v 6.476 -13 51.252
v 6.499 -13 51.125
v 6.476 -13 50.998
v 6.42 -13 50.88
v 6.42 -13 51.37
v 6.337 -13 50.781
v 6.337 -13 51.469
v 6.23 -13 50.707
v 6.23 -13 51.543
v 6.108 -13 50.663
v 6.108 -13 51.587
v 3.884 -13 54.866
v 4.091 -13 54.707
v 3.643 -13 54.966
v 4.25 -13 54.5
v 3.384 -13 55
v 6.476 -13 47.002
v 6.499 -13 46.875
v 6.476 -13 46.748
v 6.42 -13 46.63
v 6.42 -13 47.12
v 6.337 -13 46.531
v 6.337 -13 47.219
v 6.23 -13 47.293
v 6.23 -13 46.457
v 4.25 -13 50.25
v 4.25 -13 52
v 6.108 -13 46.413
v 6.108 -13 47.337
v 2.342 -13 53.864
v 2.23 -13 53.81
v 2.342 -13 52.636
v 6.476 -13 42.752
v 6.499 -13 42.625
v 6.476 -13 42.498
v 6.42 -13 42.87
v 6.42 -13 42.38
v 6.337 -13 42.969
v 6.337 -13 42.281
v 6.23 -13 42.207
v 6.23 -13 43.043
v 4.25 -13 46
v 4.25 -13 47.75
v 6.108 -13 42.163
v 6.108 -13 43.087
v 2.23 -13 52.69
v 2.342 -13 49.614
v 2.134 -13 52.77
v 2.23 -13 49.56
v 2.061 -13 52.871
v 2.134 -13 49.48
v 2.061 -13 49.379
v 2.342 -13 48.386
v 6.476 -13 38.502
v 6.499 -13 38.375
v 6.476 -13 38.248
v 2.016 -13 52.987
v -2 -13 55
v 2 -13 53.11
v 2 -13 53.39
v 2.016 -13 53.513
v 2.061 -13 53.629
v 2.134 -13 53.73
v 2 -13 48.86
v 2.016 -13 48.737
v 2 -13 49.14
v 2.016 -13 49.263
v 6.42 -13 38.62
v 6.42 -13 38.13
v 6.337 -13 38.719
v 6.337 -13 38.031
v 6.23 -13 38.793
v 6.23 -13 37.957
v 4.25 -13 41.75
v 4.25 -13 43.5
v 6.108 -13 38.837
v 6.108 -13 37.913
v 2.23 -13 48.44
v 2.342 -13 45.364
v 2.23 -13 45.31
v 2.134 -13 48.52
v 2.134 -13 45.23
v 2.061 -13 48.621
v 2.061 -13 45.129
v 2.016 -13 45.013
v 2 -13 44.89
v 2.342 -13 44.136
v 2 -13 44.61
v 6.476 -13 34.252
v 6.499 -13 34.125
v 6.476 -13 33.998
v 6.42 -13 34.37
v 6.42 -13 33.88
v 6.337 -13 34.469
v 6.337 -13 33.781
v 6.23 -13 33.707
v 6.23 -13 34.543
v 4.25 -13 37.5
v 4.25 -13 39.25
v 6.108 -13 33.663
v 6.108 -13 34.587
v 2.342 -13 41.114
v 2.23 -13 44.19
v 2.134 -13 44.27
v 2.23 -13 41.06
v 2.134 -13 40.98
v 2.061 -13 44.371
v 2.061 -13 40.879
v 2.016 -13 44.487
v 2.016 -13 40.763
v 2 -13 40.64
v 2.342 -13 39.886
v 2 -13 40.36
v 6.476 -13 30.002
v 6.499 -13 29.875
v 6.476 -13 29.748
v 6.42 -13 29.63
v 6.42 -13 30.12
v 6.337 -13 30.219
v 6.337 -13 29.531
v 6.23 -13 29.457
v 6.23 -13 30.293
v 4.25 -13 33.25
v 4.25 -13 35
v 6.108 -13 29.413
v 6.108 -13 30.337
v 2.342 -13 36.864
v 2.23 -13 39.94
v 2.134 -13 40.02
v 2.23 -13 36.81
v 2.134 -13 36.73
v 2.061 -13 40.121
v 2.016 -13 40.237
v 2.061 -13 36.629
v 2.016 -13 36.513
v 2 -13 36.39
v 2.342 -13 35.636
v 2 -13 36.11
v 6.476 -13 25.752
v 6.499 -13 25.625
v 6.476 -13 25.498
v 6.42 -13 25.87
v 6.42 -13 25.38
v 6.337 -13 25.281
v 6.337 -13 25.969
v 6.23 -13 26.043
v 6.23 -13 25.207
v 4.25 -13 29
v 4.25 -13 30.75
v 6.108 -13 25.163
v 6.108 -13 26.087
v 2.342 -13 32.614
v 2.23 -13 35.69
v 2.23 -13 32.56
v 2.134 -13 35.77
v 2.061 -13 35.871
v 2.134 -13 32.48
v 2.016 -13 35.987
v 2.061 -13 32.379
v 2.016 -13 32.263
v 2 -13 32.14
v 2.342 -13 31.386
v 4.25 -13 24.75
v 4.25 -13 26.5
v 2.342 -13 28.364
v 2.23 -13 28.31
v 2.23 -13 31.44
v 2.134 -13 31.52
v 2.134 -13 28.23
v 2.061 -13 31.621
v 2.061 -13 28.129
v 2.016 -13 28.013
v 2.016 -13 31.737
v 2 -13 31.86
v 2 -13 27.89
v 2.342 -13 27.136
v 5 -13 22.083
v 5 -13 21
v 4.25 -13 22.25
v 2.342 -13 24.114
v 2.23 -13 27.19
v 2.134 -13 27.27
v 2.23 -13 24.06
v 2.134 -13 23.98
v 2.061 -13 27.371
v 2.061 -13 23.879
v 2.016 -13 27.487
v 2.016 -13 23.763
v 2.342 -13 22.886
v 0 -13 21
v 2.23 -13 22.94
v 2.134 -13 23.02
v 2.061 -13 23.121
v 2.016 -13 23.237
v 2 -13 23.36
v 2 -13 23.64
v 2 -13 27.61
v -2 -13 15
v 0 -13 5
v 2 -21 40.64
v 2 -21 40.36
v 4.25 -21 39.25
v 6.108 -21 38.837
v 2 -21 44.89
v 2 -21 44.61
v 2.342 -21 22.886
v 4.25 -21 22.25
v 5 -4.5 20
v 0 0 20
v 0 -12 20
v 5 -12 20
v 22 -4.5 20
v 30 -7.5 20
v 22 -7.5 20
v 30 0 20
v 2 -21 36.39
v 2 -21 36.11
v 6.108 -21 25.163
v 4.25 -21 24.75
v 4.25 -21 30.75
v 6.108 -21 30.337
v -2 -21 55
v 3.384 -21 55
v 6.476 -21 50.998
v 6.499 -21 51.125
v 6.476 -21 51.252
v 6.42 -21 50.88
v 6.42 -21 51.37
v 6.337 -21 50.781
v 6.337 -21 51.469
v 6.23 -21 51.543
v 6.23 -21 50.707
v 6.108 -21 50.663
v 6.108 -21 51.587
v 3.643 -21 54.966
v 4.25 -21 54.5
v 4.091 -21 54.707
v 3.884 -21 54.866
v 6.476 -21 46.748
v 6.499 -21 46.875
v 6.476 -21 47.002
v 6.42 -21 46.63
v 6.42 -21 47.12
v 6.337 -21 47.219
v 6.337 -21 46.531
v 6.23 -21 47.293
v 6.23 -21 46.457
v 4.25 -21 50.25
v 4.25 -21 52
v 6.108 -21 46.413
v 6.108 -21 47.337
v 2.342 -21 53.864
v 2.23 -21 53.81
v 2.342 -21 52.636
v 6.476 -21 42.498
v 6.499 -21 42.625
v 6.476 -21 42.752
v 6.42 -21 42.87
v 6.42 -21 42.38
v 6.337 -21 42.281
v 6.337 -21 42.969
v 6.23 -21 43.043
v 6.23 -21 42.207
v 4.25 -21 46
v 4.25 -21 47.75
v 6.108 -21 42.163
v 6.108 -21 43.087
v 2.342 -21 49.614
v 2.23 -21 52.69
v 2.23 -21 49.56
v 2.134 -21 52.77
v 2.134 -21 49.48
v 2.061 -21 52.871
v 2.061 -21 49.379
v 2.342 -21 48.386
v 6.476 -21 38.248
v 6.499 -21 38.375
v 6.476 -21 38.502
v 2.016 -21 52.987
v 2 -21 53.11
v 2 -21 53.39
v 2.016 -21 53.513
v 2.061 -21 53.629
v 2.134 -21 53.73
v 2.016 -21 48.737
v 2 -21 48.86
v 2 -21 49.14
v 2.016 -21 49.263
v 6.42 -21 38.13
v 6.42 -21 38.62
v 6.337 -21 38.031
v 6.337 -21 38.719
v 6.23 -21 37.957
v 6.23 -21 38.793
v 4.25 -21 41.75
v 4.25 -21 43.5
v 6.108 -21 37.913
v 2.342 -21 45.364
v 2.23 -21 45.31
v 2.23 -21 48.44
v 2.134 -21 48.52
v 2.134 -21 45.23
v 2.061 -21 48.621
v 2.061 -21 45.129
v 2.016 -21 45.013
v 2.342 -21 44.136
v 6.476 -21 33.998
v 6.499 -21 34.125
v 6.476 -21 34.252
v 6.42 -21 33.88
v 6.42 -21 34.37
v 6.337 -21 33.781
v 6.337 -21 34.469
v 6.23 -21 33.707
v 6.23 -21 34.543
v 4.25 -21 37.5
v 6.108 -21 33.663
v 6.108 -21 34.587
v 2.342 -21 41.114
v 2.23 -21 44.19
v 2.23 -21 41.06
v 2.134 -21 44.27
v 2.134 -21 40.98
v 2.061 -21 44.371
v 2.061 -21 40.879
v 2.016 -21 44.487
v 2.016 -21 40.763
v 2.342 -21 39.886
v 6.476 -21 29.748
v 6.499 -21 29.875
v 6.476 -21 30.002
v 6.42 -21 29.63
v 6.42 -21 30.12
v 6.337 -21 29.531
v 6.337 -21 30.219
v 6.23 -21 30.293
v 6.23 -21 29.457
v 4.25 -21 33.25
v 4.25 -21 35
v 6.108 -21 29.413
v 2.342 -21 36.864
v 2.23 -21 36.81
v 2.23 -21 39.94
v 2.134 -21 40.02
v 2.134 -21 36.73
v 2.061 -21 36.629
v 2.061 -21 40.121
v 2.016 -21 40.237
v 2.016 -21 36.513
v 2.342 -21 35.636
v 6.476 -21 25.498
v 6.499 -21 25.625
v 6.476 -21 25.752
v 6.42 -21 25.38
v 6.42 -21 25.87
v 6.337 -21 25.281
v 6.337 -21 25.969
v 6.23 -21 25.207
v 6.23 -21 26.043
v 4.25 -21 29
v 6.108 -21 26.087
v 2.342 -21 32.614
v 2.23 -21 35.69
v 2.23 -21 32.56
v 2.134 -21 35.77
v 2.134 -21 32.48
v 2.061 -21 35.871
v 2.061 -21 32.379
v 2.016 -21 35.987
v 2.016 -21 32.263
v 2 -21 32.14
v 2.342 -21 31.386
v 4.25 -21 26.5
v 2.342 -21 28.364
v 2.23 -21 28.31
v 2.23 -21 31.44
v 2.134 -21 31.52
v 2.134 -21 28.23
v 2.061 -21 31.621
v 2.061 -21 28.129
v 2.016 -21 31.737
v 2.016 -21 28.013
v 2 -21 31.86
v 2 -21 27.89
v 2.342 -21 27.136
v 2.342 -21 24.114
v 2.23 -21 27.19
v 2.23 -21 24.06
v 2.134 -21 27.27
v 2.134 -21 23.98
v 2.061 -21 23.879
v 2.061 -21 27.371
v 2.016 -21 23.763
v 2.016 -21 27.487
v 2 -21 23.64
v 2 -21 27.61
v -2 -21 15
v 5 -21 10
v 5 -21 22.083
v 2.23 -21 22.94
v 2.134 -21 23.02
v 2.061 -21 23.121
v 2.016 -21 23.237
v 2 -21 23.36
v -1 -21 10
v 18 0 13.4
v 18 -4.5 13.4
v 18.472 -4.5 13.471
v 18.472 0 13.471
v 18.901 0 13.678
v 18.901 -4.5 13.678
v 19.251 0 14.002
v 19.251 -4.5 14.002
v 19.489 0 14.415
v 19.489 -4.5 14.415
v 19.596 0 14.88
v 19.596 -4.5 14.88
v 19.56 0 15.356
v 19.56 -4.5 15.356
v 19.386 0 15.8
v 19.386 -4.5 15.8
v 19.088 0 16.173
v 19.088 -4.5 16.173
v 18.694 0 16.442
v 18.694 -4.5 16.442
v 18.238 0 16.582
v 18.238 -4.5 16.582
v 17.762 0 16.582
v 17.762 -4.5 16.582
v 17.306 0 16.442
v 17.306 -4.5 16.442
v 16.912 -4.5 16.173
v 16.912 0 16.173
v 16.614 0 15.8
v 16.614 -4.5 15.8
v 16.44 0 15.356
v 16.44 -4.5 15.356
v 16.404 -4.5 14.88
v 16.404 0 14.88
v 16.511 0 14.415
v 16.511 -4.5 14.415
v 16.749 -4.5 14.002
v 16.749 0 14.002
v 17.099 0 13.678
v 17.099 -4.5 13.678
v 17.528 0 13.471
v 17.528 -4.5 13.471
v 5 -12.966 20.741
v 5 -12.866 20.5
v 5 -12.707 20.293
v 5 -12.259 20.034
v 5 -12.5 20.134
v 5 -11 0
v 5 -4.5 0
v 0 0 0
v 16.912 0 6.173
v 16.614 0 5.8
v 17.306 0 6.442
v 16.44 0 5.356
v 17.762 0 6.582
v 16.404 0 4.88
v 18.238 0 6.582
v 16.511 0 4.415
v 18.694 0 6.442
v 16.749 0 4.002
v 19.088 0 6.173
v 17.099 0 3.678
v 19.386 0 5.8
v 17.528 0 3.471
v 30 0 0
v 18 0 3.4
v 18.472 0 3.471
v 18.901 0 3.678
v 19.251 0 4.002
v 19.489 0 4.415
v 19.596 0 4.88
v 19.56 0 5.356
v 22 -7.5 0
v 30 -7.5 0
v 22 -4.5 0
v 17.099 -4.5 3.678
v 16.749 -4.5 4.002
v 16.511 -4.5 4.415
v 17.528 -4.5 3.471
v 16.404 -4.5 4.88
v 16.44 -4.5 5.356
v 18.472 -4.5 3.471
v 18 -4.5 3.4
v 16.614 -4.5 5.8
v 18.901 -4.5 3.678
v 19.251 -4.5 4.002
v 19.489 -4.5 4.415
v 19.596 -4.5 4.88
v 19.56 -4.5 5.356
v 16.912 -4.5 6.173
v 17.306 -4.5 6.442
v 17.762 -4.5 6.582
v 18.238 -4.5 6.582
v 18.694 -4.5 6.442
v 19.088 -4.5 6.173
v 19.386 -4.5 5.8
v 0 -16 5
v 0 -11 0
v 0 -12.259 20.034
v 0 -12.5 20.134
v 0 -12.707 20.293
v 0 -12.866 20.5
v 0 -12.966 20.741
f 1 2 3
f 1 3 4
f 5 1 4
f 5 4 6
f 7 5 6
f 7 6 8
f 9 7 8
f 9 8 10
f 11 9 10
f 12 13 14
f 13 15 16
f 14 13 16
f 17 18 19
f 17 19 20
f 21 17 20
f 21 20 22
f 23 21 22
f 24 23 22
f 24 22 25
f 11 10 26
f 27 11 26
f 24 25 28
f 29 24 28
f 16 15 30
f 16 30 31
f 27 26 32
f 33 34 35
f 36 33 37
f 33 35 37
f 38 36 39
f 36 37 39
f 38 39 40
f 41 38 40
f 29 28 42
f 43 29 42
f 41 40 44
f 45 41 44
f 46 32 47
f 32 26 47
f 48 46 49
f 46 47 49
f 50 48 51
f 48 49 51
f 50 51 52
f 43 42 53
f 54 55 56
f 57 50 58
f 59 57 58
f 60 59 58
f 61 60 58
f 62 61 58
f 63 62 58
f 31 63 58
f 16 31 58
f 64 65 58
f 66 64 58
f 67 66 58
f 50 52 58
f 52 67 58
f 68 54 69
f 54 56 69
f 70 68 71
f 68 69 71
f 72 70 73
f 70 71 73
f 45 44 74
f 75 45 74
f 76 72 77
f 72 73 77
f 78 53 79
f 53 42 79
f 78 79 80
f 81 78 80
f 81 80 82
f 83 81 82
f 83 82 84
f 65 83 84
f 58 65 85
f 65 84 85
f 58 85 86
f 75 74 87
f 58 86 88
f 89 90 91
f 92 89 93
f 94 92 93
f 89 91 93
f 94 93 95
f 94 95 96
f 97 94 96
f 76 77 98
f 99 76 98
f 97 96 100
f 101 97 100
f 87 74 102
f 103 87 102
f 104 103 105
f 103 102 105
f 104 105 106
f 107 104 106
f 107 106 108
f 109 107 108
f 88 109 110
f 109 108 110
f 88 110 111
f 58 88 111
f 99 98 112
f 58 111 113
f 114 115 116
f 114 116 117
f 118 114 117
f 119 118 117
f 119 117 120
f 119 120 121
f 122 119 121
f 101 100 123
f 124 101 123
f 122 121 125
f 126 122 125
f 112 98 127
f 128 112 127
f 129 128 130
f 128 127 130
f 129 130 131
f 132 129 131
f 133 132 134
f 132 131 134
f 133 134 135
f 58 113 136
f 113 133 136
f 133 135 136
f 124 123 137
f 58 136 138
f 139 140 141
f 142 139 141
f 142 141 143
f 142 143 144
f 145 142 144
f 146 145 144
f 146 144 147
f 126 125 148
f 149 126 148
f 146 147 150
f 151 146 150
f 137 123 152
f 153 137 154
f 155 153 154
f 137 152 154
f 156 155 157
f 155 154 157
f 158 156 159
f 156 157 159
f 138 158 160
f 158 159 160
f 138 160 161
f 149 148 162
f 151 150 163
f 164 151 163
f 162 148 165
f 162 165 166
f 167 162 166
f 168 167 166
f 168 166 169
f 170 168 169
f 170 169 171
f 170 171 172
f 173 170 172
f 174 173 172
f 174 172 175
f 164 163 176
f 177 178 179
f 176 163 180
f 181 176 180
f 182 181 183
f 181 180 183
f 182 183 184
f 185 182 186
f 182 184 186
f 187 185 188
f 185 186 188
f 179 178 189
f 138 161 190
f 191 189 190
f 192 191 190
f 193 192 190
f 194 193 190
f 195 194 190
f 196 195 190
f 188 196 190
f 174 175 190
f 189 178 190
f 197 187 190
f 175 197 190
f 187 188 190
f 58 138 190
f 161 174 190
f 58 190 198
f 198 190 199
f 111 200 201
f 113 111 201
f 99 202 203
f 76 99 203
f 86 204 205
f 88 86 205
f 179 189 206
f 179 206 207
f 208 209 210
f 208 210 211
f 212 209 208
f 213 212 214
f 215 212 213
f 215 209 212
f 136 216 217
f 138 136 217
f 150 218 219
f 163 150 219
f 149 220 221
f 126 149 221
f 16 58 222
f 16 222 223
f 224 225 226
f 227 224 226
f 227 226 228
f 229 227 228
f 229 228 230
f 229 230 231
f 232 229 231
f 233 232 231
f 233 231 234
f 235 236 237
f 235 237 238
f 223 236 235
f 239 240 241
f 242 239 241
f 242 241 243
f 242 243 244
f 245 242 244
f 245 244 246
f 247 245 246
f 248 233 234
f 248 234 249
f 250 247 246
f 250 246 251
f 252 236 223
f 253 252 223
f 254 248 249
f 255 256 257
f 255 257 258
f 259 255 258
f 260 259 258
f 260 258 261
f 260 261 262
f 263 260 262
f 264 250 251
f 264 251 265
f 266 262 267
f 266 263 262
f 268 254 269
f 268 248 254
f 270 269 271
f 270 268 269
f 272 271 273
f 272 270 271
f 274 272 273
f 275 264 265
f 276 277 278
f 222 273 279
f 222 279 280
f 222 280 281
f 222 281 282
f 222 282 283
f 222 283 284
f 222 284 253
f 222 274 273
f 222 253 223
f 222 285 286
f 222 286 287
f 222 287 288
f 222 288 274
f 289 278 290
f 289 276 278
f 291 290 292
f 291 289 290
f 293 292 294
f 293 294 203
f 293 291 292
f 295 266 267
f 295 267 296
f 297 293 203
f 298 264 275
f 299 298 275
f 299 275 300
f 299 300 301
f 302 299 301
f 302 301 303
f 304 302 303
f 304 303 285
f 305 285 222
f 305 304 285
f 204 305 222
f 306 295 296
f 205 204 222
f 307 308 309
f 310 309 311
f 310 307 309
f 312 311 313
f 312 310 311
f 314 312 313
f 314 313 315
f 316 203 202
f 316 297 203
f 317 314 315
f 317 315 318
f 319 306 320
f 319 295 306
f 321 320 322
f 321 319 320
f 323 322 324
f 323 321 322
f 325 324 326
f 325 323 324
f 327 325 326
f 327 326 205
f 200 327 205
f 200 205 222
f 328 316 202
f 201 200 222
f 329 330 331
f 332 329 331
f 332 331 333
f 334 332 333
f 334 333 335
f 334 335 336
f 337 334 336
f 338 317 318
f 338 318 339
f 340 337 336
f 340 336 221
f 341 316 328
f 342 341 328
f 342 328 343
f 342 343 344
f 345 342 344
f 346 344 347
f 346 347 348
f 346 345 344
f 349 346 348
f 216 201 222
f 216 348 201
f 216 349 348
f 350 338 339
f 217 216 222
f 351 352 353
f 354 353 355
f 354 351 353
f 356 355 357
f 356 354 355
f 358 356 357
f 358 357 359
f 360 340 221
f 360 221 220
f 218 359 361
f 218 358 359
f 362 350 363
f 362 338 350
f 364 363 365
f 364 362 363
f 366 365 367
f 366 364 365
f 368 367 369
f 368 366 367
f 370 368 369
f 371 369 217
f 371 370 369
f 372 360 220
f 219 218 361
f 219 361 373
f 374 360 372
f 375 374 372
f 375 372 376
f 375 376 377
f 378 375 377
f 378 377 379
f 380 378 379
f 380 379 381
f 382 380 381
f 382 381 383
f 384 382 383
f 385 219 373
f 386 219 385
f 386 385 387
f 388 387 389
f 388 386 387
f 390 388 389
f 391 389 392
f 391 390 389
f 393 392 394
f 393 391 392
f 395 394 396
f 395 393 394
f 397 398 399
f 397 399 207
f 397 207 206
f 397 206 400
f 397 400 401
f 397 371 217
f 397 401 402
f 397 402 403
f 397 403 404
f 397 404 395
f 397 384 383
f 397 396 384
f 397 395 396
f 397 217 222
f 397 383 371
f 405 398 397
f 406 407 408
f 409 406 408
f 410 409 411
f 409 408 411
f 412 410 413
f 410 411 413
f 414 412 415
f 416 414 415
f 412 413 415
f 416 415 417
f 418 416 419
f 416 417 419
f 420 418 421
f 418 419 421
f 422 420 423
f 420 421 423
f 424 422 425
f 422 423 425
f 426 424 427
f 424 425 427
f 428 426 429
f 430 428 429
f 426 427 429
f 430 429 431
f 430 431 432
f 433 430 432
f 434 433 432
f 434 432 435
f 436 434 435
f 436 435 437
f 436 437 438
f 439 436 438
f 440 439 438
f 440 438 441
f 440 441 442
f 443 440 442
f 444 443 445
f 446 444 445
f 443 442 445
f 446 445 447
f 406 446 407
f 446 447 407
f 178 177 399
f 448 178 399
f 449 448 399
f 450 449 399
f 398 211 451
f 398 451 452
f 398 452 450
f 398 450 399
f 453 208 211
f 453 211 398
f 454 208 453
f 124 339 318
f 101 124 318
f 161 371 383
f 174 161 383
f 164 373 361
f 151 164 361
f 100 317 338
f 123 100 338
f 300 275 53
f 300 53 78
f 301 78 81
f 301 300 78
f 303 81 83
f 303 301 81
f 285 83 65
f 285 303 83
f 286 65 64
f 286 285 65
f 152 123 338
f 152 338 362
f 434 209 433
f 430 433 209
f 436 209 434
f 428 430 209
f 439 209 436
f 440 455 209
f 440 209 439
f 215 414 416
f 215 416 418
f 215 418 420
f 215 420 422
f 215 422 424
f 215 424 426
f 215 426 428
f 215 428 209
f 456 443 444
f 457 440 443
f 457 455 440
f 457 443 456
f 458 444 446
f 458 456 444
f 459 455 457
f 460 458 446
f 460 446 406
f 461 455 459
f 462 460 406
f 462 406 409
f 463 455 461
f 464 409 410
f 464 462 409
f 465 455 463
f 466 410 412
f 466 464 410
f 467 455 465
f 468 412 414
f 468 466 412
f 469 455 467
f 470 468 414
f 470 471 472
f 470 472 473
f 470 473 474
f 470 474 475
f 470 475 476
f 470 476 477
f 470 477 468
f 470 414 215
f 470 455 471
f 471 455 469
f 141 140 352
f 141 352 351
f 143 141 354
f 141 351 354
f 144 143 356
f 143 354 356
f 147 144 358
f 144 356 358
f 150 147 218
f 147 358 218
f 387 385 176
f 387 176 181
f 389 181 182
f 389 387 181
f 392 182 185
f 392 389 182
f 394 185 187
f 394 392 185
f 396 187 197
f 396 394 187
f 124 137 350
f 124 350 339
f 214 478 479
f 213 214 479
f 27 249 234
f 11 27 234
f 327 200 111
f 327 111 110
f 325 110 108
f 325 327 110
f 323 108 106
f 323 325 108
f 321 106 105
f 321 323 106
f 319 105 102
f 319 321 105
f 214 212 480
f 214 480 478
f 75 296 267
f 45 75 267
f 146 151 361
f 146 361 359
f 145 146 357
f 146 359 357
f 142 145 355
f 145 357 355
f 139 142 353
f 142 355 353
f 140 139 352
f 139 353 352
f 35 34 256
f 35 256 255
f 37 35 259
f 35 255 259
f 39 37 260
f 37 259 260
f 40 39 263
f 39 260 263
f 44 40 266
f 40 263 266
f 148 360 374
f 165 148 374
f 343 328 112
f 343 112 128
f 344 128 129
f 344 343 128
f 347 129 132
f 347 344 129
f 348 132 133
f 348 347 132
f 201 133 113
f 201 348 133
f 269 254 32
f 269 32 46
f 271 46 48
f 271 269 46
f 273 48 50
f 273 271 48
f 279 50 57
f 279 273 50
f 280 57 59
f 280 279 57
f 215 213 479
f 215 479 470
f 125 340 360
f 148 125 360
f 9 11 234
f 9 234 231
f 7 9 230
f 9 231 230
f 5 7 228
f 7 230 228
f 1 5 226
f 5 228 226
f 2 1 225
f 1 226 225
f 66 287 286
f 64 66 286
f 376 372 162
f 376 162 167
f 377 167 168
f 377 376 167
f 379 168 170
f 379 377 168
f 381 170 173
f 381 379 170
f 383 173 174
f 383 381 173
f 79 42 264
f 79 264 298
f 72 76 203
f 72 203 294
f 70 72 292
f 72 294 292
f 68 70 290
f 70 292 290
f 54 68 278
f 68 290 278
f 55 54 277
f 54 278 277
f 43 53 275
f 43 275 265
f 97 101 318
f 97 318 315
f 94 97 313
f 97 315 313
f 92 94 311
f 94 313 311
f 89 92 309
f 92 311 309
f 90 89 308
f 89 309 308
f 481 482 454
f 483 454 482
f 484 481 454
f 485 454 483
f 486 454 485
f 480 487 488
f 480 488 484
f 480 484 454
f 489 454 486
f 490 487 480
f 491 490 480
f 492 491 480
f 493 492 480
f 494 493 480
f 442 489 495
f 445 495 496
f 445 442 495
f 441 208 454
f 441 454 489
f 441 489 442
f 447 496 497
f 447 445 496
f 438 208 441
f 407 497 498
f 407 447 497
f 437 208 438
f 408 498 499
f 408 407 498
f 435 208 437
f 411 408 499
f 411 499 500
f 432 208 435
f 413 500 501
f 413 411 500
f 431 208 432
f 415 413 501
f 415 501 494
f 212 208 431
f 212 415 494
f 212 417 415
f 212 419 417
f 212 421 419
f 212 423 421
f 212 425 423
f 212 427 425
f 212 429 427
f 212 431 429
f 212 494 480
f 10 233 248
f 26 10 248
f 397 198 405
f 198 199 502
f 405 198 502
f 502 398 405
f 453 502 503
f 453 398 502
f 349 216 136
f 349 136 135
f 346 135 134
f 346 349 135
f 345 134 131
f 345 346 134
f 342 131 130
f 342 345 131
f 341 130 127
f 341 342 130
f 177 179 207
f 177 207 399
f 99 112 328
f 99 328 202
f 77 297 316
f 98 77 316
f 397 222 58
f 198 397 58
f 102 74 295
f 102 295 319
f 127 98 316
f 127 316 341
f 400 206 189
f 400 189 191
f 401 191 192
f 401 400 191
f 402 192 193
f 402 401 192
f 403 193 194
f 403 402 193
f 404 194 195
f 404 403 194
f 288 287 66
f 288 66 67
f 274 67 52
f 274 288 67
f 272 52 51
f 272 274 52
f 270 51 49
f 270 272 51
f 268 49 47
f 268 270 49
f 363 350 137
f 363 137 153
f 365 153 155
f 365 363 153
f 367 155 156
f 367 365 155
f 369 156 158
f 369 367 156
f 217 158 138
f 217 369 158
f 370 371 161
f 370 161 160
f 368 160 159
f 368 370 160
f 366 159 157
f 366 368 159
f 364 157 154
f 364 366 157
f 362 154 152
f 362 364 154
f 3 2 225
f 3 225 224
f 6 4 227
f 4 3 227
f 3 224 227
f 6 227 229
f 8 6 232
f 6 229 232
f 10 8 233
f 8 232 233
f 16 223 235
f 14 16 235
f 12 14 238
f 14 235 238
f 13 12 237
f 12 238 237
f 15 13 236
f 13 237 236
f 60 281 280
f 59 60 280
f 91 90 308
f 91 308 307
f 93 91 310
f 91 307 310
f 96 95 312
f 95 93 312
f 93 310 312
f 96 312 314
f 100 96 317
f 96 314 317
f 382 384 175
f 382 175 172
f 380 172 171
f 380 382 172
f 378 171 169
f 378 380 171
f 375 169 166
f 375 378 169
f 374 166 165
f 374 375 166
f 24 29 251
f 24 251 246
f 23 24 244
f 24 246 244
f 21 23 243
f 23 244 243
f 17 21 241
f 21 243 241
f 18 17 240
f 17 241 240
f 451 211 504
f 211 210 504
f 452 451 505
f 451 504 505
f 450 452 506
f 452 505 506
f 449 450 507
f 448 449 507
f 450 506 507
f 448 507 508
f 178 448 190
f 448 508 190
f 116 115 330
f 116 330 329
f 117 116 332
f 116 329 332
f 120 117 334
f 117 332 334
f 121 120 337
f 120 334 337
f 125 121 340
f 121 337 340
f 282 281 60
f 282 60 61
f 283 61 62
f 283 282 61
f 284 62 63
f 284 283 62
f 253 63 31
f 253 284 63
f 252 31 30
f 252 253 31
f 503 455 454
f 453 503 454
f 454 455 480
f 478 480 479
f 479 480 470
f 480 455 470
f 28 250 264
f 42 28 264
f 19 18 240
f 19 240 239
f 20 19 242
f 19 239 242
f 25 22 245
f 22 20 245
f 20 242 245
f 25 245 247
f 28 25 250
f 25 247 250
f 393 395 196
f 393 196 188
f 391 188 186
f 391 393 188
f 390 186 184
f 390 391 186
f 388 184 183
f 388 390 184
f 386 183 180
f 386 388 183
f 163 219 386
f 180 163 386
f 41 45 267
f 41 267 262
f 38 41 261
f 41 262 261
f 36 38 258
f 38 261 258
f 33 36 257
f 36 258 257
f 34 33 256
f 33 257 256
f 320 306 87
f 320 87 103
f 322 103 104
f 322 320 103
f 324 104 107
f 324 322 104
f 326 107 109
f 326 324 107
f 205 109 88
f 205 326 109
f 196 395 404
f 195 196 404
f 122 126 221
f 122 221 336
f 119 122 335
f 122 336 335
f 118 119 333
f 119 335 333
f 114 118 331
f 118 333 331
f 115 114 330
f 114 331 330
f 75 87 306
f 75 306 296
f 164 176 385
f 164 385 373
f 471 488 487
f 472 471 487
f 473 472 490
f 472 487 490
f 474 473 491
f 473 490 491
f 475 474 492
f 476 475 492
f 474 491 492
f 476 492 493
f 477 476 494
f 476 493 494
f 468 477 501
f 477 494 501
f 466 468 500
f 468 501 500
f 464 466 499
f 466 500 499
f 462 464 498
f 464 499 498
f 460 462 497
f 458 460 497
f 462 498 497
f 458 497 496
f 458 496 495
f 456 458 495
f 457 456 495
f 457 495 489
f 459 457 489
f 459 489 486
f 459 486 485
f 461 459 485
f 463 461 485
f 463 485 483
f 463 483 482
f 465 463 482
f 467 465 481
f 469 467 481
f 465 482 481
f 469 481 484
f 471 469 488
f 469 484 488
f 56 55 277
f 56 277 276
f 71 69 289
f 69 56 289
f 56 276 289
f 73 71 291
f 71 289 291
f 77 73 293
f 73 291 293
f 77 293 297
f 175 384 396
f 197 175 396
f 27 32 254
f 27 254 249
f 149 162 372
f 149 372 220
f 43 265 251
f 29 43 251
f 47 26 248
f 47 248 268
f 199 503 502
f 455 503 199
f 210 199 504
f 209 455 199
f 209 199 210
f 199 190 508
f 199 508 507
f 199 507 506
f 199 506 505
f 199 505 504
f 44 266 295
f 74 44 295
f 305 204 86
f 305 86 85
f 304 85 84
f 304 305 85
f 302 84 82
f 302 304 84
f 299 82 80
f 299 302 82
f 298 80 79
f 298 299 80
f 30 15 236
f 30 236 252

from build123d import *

# Parameters (mm, degrees)
SKETCH1_W           = 30
SKETCH1_H           = 16
BOSS_EXTRUDE1_DEPTH = 20
CUT_EXTRUDE1_DEPTH  = 20
SKETCH3_W           = 6
SKETCH3_H           = 10
BOSS_EXTRUDE2_DEPTH = 5
SKETCH9_R           = 1.6
CUT_EXTRUDE3_DEPTH  = 4.5
SKETCH11_W          = 10
SKETCH11_H          = 8
BOSS_EXTRUDE4_DEPTH = 40
CHAMFER2_SIZE2      = 10
CHAMFER2_SIZE       = 2
FILLET1_R           = 1
CUT_EXTRUDE4_DEPTH  = 8
SKETCH13_W          = 2
SKETCH13_H          = 8
BOSS_EXTRUDE5_DEPTH = 10
LPATTERN1_COUNT     = 8
LPATTERN1_PITCH     = 4.25
FILLET2_R           = 0.5
FILLET3_R           = 1
SKETCH14_W          = 2
SKETCH14_H          = 8
CUT_EXTRUDE5_DEPTH  = 17
CHAMFER9_SIZE       = 5
SKETCH15_W          = 19.120114905
SKETCH15_H          = 8.62957368
CUT_EXTRUDE6_DEPTH  = 1


# Some blends are built 0.0001 mm under size
with BuildPart() as part:
    # Sketch1 → Boss-Extrude1 (new body)
    with BuildSketch(Plane.XY):
        with Locations((15, -8)):
            Rectangle(SKETCH1_W, SKETCH1_H)
    extrude(amount=BOSS_EXTRUDE1_DEPTH)

    # Sketch2 → Cut-Extrude1 (cut)
    with BuildSketch(Plane.XY.offset(20)):
        Polygon((22, -4.5), (22, -7.5), (30, -7.5), (30, -16), (5, -16), (5, -4.5), align=None)
    extrude(amount=-CUT_EXTRUDE1_DEPTH, mode=Mode.SUBTRACT)

    # Sketch3 → Boss-Extrude2 (add)
    with BuildSketch(Plane.XZ.offset(16)):
        with Locations((3, 10)):
            Rectangle(SKETCH3_W, SKETCH3_H)
    extrude(amount=BOSS_EXTRUDE2_DEPTH)

    # Sketch9 → Cut-Extrude3 (cut)
    with BuildSketch(Plane.XZ.offset(4.5)):
        with Locations(Location((18, 15, 0), (0, 0, 270))):
            Circle(SKETCH9_R)
        with Locations(Location((18, 5, 0), (0, 0, 270))):
            Circle(SKETCH9_R)
    extrude(amount=-CUT_EXTRUDE3_DEPTH, mode=Mode.SUBTRACT)

    # Sketch11 → Boss-Extrude4 (add)
    with BuildSketch(Plane.XY.offset(15)):
        with Locations((3, -17)):
            Rectangle(SKETCH11_W, SKETCH11_H)
    extrude(amount=BOSS_EXTRUDE4_DEPTH)

    # Chamfer2
    chamfer2_edges = [part.edges().sort_by_distance(p)[0] for p in [
        (0, -17, 15),
    ]]
    chamfer2_side = [part.faces().sort_by_distance(p)[0] for p in [
        (-0.04, -17, 15),
    ]]
    chamfer(chamfer2_edges, length=CHAMFER2_SIZE - 0.0001, length2=CHAMFER2_SIZE2 - 0.0001, reference=chamfer2_side[0])  # a hair under: the kernel refuses the full size

    # Fillet1
    fillet1_edges = [part.edges().sort_by_distance(p)[0] for p in [
        (2.5, -13, 20),
    ]]
    fillet(fillet1_edges, radius=FILLET1_R)

    # Sketch12 → Cut-Extrude4 (cut)
    with BuildSketch(Plane.XZ.offset(21)):
        Polygon((6.5, 55), (4.25, 54.5), (2, 53.75), (2, 52.75), (4.25, 52), (6.5, 51.5), (6.5, 50.75), (8, 50.75), (8, 55), align=None)
    cut_extrude4 = extrude(amount=-CUT_EXTRUDE4_DEPTH, mode=Mode.SUBTRACT)

    # Sketch13 → Boss-Extrude5 (add)
    with BuildSketch(Plane(origin=(0, 0, 15), x_dir=(-1, 0, 0), z_dir=(0, 0, -1))):
        with Locations((-7, -17)):
            Rectangle(SKETCH13_W, SKETCH13_H)
    extrude(amount=BOSS_EXTRUDE5_DEPTH)

    # LPattern1: Cut-Extrude4 ×8
    with Locations(*[(0, 0, -i * LPATTERN1_PITCH) for i in range(1, LPATTERN1_COUNT)]):
        add(cut_extrude4, mode=Mode.SUBTRACT)

    # Fillet2
    # the kernel refuses this fillet: 0.5 mm, written as the material it adds along each edge
    with BuildSketch(Plane(origin=(2, -21, 52.75), x_dir=(0.9486832980505142, 0, -0.31622776601683683), z_dir=(0, 1, 0)), Plane(origin=(2, -21, 53.75), x_dir=(0, 0, -1), z_dir=(0, 1, 0)), Plane(origin=(2, -21, 48.5), x_dir=(0.9486832980505137, 0, -0.31622776601683833), z_dir=(0, 1, 0)), Plane(origin=(2, -21, 49.5), x_dir=(0, 0, -1), z_dir=(0, 1, 0)), Plane(origin=(2, -21, 44.25), x_dir=(0.9486832980505137, 0, -0.31622776601683833), z_dir=(0, 1, 0)), Plane(origin=(2, -21, 45.25), x_dir=(0, 0, -1), z_dir=(0, 1, 0)), Plane(origin=(2, -21, 35.75), x_dir=(0.9486832980505137, 0, -0.31622776601683833), z_dir=(0, 1, 0)), Plane(origin=(2, -21, 36.75), x_dir=(0, 0, -1), z_dir=(0, 1, 0)), Plane(origin=(2, -21, 40), x_dir=(0.9486832980505137, 0, -0.31622776601683833), z_dir=(0, 1, 0)), Plane(origin=(2, -21, 41), x_dir=(0, 0, -1), z_dir=(0, 1, 0)), Plane(origin=(2, -21, 23), x_dir=(0.9486832980505137, 0, -0.31622776601683833), z_dir=(0, 1, 0)), Plane(origin=(2, -21, 24), x_dir=(0, 0, -1), z_dir=(0, 1, 0)), Plane(origin=(2, -21, 27.25), x_dir=(0.9486832980505137, 0, -0.31622776601683833), z_dir=(0, 1, 0)), Plane(origin=(2, -21, 28.25), x_dir=(0, 0, -1), z_dir=(0, 1, 0)), Plane(origin=(2, -21, 32.5), x_dir=(0, 0, -1), z_dir=(0, 1, 0)), Plane(origin=(2, -21, 31.5), x_dir=(0.9486832980505137, 0, -0.31622776601683833), z_dir=(0, 1, 0))) as fillet2_piece_1:
        with BuildLine():
            CenterArc((FILLET2_R * 0.720759220056, -FILLET2_R), FILLET2_R, 90, 71.565051177)
            Line((-FILLET2_R * 0.227924077994, -FILLET2_R * 0.683772233983), (0, 0))
            Line((0, 0), (FILLET2_R * 0.720759220056, 0))
        make_face()
    extrude(amount=8)
    # the kernel refuses this fillet: 0.5 mm, written as the material it takes off along each edge
    with BuildSketch(Plane(origin=(6.5, -22.002714508, 33.75), x_dir=(-0.9761870601839537, 0, -0.21693045781865147), z_dir=(0, 1, 0)), Plane(origin=(6.5, -22.002714508, 34.5), x_dir=(0, 0, -1), z_dir=(0, 1, 0)), Plane(origin=(6.5, -22.002714508, 38), x_dir=(-0.9761870601839536, 0, -0.21693045781865192), z_dir=(0, 1, 0)), Plane(origin=(6.5, -22.002714508, 38.75), x_dir=(0, 0, -1), z_dir=(0, 1, 0)), Plane(origin=(6.5, -22.002714508, 42.25), x_dir=(-0.9761870601839541, 0, -0.21693045781865056), z_dir=(0, 1, 0)), Plane(origin=(6.5, -22.002714508, 43), x_dir=(0, 0, -1), z_dir=(0, 1, 0)), Plane(origin=(6.5, -22.002714508, 46.5), x_dir=(-0.9761870601839537, 0, -0.21693045781865147), z_dir=(0, 1, 0)), Plane(origin=(6.5, -22.002714508, 47.25), x_dir=(0, 0, -1), z_dir=(0, 1, 0)), Plane(origin=(6.5, -22.002714508, 50.75), x_dir=(-0.9761870601839541, 0, -0.21693045781865006), z_dir=(0, 1, 0)), Plane(origin=(6.5, -22.002714508, 51.5), x_dir=(0, 0, -1), z_dir=(0, 1, 0)), Plane(origin=(6.5, -22.002714508, 25.25), x_dir=(-0.9761870601839524, 0, -0.21693045781865805), z_dir=(0, 1, 0)), Plane(origin=(6.5, -22.002714508, 26), x_dir=(0, 0, -1), z_dir=(0, 1, 0)), Plane(origin=(6.5, -22.002714508, 29.5), x_dir=(-0.9761870601839522, 0, -0.216930457818659), z_dir=(0, 1, 0)), Plane(origin=(6.5, -22.002714508, 30.25), x_dir=(0, 0, -1), z_dir=(0, 1, 0))) as fillet2_2_piece_1:
        with BuildLine():
            CenterArc((FILLET2_R * 0.802171606366, FILLET2_R), FILLET2_R, 192.528807709, 77.471192291)
            Line((-FILLET2_R * 0.174015453818, FILLET2_R * 0.783069542181), (0, 0))
            Line((0, 0), (FILLET2_R * 0.802171606366, 0))
        make_face()
    extrude(amount=10.005429016, mode=Mode.SUBTRACT)

    # Fillet3
    # the kernel refuses this fillet: 1 mm, written as the material it takes off along each edge
    with BuildSketch(Plane(origin=(6.5, -28.790063509, 55), x_dir=(-1, 0, 0), z_dir=(0, 1, 0))) as fillet3_piece_1:
        with BuildLine():
            CenterArc((3.116025404, -1), FILLET3_R, 90, 60)
            Line((2.25, -0.5), (0, 0))
            Line((0, 0), (3.116025404, 0))
        make_face()
    extrude(amount=23.580127019, mode=Mode.SUBTRACT)

    # Sketch14 → Cut-Extrude5 (cut)
    with BuildSketch(Plane(origin=(0, 0, 5), x_dir=(-1, 0, 0), z_dir=(0, 0, -1))):
        with Locations((-7, -17)):
            Rectangle(SKETCH14_W, SKETCH14_H)
    extrude(amount=-CUT_EXTRUDE5_DEPTH, mode=Mode.SUBTRACT)

    # Chamfer9
    # the kernel refuses this chamfer: 5 mm, written as the material it takes off along each edge
    with BuildSketch(Plane(origin=(5, -16, 17.85841494), x_dir=(0, 1, 0), z_dir=(0, 0, -1))) as chamfer9_piece_1_section:
        Polygon((CHAMFER9_SIZE, 0), (0, -CHAMFER9_SIZE), (0, 0), align=None)
    chamfer9_piece_1 = extrude(amount=30.71682988, mode=Mode.PRIVATE)
    chamfer9_piece_1 = split(chamfer9_piece_1, bisect_by=Plane(origin=(5, -22.42920747, 11.42920747), z_dir=(0, -0.7071067811865476, -0.7071067811865476)), keep=Keep.TOP, mode=Mode.PRIVATE)
    add(chamfer9_piece_1, mode=Mode.SUBTRACT)
    with BuildSketch(Plane(origin=(0, -16, -12.85841494), x_dir=(0, 1, 0), z_dir=(0, 0, 1))) as chamfer9_piece_2_section:
        Polygon((CHAMFER9_SIZE, 0), (0, -CHAMFER9_SIZE), (0, 0), align=None)
    chamfer9_piece_2 = extrude(amount=30.71682988, mode=Mode.PRIVATE)
    chamfer9_piece_2 = split(chamfer9_piece_2, bisect_by=Plane(origin=(0, -7.07079253, -3.92920747), z_dir=(0, -0.7071067811865476, -0.7071067811865476)), keep=Keep.TOP, mode=Mode.PRIVATE)
    add(chamfer9_piece_2, mode=Mode.SUBTRACT)
    with BuildSketch(Plane(origin=(0, -3.14158506, 5), x_dir=(1, 0, 0), z_dir=(0, -1, 0))) as chamfer9_piece_3_section:
        Polygon((CHAMFER9_SIZE, 0), (0, CHAMFER9_SIZE), (0, 0), align=None)
    chamfer9_piece_3 = extrude(amount=30.71682988, mode=Mode.PRIVATE)
    chamfer9_piece_3 = split(chamfer9_piece_3, bisect_by=Plane(origin=(0, -9.57079253, -1.42920747), z_dir=(0, -0.707106781186547, -0.7071067811865481)), keep=Keep.TOP, mode=Mode.PRIVATE)
    add(chamfer9_piece_3, mode=Mode.SUBTRACT)
    with BuildSketch(Plane(origin=(18.85841494, -21, 5), x_dir=(0, 0, 1), z_dir=(-1, 0, 0))) as chamfer9_piece_4:
        Polygon((CHAMFER9_SIZE, 0), (0, CHAMFER9_SIZE), (0, 0), align=None)
    extrude(amount=31.71682988, mode=Mode.SUBTRACT)
    with BuildSketch(Plane(origin=(6, -33.85841494, 5), x_dir=(0, 0, 1), z_dir=(0, 1, 0))) as chamfer9_piece_5_section:
        Polygon((CHAMFER9_SIZE, 0), (0, -CHAMFER9_SIZE), (0, 0), align=None)
    chamfer9_piece_5 = extrude(amount=30.71682988, mode=Mode.PRIVATE)
    chamfer9_piece_5 = split(chamfer9_piece_5, bisect_by=Plane(origin=(6, -24.92920747, 13.92920747), z_dir=(0, -0.707106781186547, -0.7071067811865481)), keep=Keep.TOP, mode=Mode.PRIVATE)
    add(chamfer9_piece_5, mode=Mode.SUBTRACT)
    with BuildSketch(Plane(origin=(17.85841494, -16, 0), x_dir=(0, 0, 1), z_dir=(-1, 0, 0))) as chamfer9_piece_6:
        Polygon((CHAMFER9_SIZE, 0), (0, CHAMFER9_SIZE), (0, 0), align=None)
    extrude(amount=30.71682988, mode=Mode.SUBTRACT)

    # Sketch15 → Cut-Extrude6 (cut)
    with BuildSketch(Plane(origin=(6, 0, 0), x_dir=(0, 0, -1), z_dir=(1, 0, 0))):
        with Locations((-12.83373262, -16.68521316)):
            Rectangle(SKETCH15_W, SKETCH15_H)
    extrude(amount=-CUT_EXTRUDE6_DEPTH, mode=Mode.SUBTRACT)


solid = part.part
